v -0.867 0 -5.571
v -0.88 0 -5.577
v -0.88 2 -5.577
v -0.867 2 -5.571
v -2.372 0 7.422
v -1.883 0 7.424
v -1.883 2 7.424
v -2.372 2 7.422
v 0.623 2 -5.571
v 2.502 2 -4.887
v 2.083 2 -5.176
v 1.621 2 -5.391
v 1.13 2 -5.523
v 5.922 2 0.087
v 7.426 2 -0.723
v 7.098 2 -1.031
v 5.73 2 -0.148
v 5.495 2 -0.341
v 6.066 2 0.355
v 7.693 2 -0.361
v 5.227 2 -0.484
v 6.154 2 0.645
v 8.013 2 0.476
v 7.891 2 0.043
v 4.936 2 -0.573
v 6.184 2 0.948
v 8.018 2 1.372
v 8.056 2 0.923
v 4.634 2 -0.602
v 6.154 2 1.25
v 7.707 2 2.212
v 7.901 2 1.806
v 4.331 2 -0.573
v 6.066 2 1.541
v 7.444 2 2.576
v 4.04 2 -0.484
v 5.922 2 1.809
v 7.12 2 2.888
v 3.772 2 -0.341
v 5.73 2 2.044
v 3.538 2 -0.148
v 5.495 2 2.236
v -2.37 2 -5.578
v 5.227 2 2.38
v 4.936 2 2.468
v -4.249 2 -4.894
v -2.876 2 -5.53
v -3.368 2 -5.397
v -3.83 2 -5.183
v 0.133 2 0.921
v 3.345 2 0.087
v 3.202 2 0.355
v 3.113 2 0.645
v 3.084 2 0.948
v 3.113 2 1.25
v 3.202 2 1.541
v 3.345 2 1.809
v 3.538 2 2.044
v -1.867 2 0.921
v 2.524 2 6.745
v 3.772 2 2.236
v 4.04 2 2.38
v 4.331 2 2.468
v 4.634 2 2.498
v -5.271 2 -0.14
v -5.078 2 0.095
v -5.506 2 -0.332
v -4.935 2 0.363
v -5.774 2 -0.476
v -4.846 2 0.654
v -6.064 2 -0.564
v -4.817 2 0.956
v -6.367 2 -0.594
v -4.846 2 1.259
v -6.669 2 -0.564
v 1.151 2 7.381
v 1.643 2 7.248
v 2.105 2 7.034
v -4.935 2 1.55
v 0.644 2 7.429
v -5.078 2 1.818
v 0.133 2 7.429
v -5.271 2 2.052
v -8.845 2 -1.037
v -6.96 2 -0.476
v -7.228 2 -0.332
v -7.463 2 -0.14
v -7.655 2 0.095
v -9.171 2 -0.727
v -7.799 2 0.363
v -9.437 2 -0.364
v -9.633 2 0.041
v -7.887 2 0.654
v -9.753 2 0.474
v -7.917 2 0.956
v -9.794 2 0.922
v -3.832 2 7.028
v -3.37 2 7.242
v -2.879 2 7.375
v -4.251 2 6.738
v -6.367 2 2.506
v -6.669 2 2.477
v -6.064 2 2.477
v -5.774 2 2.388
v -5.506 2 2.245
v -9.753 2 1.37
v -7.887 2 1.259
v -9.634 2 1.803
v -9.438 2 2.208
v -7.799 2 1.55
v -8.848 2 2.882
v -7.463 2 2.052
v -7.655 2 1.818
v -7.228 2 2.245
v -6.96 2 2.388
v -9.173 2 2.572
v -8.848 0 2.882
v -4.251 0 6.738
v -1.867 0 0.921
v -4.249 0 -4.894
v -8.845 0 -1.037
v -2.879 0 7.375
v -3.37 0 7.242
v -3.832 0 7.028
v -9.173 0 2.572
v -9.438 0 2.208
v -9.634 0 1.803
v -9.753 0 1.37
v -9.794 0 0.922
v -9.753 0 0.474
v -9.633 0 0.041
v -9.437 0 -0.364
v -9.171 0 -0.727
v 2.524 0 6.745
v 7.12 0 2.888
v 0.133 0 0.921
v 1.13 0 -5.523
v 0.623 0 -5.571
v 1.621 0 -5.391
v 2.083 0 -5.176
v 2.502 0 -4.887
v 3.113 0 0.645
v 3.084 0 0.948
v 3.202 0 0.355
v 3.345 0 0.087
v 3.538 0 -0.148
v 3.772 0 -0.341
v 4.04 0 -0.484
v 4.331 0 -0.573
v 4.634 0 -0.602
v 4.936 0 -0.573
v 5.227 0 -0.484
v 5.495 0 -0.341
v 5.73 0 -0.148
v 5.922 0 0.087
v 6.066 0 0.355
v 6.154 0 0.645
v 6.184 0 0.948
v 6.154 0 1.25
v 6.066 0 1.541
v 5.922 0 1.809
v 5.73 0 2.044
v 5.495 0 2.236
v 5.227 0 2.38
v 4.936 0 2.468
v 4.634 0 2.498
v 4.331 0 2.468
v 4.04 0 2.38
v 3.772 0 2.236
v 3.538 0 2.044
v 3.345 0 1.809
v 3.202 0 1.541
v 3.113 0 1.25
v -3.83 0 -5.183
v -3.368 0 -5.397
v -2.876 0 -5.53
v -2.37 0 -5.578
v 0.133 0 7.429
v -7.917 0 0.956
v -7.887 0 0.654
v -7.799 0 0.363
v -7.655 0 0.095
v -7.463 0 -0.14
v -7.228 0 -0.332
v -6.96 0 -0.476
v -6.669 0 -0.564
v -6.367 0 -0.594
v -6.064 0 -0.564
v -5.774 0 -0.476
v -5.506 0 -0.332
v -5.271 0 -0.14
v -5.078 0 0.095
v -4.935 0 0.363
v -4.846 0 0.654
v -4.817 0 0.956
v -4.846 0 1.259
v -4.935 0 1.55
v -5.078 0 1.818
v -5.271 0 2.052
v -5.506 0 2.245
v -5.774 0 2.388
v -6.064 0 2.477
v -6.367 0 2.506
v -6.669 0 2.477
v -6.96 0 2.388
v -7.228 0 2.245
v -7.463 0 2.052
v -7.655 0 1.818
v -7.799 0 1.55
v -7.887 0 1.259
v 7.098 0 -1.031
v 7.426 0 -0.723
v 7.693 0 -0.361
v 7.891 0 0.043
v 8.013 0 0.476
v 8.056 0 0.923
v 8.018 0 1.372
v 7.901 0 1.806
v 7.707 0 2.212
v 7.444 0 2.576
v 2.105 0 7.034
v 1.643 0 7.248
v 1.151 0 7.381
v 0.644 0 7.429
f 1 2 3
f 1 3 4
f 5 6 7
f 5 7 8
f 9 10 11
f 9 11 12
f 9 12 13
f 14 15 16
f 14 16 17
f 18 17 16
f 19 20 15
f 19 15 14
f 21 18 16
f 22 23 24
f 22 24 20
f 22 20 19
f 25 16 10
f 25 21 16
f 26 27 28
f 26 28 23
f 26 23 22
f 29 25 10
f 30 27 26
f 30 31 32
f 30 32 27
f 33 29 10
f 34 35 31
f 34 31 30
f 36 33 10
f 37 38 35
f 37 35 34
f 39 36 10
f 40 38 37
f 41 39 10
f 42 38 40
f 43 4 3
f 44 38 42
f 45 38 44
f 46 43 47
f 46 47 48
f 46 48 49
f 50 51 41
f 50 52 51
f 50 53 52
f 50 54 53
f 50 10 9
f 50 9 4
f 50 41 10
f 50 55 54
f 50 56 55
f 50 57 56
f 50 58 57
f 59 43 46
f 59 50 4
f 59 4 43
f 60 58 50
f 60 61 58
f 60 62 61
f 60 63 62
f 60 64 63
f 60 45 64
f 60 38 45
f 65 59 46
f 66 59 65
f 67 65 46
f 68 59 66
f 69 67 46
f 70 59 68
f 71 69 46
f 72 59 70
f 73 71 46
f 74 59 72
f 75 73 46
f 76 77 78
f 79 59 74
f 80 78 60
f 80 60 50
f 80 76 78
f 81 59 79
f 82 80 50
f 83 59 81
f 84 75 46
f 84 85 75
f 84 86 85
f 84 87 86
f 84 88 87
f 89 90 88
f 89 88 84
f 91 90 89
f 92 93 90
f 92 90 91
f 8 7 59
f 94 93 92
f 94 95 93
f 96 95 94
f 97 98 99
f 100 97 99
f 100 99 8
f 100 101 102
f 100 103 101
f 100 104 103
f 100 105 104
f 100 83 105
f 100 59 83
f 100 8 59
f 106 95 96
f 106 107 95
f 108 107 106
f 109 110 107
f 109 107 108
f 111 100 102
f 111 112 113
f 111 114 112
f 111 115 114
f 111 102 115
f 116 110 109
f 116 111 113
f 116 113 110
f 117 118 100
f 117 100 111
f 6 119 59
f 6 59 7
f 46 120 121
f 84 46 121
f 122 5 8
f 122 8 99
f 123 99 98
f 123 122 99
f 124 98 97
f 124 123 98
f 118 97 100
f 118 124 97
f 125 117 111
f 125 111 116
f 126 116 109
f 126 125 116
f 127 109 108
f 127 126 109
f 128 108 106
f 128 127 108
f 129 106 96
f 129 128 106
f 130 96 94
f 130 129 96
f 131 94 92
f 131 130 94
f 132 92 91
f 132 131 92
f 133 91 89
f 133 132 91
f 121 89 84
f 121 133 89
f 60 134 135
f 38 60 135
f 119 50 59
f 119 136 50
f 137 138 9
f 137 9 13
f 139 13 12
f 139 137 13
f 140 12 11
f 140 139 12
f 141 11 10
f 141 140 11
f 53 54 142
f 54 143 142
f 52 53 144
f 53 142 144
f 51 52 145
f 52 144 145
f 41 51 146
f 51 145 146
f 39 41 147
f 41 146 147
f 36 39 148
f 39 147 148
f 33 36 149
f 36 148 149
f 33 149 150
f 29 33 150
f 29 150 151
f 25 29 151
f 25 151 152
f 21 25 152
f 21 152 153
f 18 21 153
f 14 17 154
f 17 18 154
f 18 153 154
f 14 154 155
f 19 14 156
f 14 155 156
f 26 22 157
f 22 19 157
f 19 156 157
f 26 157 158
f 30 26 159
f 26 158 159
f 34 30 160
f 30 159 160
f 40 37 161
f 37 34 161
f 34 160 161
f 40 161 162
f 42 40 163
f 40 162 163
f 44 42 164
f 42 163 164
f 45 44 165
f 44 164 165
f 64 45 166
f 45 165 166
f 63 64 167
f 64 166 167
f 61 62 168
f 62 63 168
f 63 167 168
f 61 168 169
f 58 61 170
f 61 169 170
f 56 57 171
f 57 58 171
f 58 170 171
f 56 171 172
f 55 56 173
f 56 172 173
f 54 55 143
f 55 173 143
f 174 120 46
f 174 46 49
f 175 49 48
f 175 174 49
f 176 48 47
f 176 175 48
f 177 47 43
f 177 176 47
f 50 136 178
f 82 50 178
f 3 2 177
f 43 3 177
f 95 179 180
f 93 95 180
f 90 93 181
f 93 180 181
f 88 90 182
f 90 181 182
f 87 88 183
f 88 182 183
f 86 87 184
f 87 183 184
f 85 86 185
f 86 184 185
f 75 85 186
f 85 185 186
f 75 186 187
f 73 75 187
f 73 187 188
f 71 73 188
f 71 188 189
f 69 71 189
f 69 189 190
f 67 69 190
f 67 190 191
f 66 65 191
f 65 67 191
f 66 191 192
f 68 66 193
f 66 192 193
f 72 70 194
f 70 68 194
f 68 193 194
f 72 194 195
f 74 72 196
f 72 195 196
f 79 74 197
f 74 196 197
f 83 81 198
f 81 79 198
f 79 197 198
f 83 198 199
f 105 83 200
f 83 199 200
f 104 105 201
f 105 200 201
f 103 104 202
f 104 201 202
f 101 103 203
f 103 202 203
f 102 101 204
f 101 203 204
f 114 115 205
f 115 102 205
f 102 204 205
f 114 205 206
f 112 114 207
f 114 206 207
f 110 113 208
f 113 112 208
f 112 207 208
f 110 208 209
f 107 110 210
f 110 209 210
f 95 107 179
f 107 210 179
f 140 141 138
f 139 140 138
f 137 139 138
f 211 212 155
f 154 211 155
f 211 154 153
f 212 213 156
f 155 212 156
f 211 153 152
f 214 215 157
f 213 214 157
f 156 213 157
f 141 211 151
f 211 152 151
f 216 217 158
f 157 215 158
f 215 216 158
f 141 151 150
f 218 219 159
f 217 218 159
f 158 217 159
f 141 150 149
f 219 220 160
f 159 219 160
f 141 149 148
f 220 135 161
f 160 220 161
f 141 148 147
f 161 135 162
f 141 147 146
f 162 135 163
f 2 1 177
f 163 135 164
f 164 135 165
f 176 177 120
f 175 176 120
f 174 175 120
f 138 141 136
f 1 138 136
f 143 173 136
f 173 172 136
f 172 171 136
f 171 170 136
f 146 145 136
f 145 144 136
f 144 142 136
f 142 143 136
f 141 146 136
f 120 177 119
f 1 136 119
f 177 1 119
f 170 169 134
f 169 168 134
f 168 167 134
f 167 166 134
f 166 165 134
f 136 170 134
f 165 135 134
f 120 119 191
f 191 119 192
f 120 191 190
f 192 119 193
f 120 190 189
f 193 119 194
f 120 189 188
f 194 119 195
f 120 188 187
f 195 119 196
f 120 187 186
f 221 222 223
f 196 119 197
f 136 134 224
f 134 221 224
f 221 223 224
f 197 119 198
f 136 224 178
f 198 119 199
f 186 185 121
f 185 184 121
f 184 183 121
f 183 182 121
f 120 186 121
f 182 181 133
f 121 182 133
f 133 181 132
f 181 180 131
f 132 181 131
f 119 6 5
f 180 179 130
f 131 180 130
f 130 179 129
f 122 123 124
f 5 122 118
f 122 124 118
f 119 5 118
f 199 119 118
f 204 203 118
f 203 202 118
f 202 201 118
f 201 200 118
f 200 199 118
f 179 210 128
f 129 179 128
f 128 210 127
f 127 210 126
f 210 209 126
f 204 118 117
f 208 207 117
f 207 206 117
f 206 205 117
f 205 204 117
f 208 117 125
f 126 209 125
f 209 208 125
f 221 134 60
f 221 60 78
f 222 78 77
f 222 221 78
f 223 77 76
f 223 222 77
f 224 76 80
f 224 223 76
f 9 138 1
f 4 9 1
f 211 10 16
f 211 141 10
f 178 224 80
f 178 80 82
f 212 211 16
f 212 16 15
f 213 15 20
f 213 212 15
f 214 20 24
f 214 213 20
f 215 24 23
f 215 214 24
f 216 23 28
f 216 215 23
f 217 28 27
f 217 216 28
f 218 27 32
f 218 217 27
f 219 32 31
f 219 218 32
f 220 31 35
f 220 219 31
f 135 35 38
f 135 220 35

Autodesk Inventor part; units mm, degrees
ref_plane "YZ Plane" through (0, 0, 0) normal (1, 0, 0) x (0, 1, 0)
ref_plane "XZ Plane" through (0, 0, 0) normal (0, 1, 0) x (-1, 0, 0)
ref_plane "XY Plane" through (0, 0, 0) normal (0, 0, 1) x (1, 0, 0)
sketch "Sketch1" plane through (0, 0, 0) normal (0, 1, 0) x (-1, 0, 0)
  line L0 (4.2489, -4.8935) -> (8.8452, -1.0368)
  line L1 (-0.6227, -5.5713) -> (0.8666, -5.5713)
  arc A0 (2.3695, -5.5775) -> (4.2489, -4.8935) centre (2.3418, -2.5777) ccw
  line L2 (0.8803, -5.5773) -> (2.3695, -5.5775)
  arc A1 (-2.502, -4.8873) -> (-0.6227, -5.5713) centre (-0.595, -2.5715) ccw
  circle A2 centre (6.3667, 0.9564) radius 1.55
  arc A3 (8.8452, -1.0368) -> (8.8476, 2.8817) centre (7.2935, 0.9234) ccw
  line L3 (-0.1334, 0.9212) -> (1.8666, 0.9212)
  arc A4 (-0.6442, 7.4287) -> (-2.5236, 6.7446) centre (-0.6165, 4.4288) ccw
  line L4 (-0.6442, 7.4287) -> (-0.1334, 7.4287)
  line L5 (-0.1334, 0.9212) -> (-0.1334, 7.4287)
  line L6 (1.8666, 0.9212) -> (1.8827, 7.4237)
  line L7 (1.8827, 7.4237) -> (2.372, 7.4225)
  arc A5 (4.2514, 6.7384) -> (2.372, 7.4225) centre (2.3443, 4.4226) ccw
  line L8 (4.2514, 6.7384) -> (8.8476, 2.8817)
  line L9 (-2.502, -4.8873) -> (-7.0983, -1.0306)
  line L10 (-2.5236, 6.7446) -> (-7.1199, 2.8879)
  circle A6 centre (-4.6336, 0.9477) radius 1.55
  arc A7 (-7.1199, 2.8879) -> (-7.0983, -1.0306) centre (-5.5563, 0.9372) ccw
  line L11 (0.8803, -5.5773) -> (0.8666, -5.5713)
  point P0 (0, 0)
  dimension "d0" = 2
  dimension "d1" = 3
  dimension "d2" = 2
  dimension "d3" = 3
  dimension "d4" = 2
  dimension "d5" = 3
  dimension "d6" = 2
  dimension "d7" = 3
  dimension "d8" = 3.1
  dimension "d9" = 3.1
  dimension "d10" = 6
  dimension "d11" = 6
  dimension "d12" = 2.5
  dimension "d13" = 6
  dimension "d14" = 6
  dimension "d15" = 2.5
extrude "Extrusion1" add sketch "Sketch1" along normal blind 2
properties part number "back_lock"
